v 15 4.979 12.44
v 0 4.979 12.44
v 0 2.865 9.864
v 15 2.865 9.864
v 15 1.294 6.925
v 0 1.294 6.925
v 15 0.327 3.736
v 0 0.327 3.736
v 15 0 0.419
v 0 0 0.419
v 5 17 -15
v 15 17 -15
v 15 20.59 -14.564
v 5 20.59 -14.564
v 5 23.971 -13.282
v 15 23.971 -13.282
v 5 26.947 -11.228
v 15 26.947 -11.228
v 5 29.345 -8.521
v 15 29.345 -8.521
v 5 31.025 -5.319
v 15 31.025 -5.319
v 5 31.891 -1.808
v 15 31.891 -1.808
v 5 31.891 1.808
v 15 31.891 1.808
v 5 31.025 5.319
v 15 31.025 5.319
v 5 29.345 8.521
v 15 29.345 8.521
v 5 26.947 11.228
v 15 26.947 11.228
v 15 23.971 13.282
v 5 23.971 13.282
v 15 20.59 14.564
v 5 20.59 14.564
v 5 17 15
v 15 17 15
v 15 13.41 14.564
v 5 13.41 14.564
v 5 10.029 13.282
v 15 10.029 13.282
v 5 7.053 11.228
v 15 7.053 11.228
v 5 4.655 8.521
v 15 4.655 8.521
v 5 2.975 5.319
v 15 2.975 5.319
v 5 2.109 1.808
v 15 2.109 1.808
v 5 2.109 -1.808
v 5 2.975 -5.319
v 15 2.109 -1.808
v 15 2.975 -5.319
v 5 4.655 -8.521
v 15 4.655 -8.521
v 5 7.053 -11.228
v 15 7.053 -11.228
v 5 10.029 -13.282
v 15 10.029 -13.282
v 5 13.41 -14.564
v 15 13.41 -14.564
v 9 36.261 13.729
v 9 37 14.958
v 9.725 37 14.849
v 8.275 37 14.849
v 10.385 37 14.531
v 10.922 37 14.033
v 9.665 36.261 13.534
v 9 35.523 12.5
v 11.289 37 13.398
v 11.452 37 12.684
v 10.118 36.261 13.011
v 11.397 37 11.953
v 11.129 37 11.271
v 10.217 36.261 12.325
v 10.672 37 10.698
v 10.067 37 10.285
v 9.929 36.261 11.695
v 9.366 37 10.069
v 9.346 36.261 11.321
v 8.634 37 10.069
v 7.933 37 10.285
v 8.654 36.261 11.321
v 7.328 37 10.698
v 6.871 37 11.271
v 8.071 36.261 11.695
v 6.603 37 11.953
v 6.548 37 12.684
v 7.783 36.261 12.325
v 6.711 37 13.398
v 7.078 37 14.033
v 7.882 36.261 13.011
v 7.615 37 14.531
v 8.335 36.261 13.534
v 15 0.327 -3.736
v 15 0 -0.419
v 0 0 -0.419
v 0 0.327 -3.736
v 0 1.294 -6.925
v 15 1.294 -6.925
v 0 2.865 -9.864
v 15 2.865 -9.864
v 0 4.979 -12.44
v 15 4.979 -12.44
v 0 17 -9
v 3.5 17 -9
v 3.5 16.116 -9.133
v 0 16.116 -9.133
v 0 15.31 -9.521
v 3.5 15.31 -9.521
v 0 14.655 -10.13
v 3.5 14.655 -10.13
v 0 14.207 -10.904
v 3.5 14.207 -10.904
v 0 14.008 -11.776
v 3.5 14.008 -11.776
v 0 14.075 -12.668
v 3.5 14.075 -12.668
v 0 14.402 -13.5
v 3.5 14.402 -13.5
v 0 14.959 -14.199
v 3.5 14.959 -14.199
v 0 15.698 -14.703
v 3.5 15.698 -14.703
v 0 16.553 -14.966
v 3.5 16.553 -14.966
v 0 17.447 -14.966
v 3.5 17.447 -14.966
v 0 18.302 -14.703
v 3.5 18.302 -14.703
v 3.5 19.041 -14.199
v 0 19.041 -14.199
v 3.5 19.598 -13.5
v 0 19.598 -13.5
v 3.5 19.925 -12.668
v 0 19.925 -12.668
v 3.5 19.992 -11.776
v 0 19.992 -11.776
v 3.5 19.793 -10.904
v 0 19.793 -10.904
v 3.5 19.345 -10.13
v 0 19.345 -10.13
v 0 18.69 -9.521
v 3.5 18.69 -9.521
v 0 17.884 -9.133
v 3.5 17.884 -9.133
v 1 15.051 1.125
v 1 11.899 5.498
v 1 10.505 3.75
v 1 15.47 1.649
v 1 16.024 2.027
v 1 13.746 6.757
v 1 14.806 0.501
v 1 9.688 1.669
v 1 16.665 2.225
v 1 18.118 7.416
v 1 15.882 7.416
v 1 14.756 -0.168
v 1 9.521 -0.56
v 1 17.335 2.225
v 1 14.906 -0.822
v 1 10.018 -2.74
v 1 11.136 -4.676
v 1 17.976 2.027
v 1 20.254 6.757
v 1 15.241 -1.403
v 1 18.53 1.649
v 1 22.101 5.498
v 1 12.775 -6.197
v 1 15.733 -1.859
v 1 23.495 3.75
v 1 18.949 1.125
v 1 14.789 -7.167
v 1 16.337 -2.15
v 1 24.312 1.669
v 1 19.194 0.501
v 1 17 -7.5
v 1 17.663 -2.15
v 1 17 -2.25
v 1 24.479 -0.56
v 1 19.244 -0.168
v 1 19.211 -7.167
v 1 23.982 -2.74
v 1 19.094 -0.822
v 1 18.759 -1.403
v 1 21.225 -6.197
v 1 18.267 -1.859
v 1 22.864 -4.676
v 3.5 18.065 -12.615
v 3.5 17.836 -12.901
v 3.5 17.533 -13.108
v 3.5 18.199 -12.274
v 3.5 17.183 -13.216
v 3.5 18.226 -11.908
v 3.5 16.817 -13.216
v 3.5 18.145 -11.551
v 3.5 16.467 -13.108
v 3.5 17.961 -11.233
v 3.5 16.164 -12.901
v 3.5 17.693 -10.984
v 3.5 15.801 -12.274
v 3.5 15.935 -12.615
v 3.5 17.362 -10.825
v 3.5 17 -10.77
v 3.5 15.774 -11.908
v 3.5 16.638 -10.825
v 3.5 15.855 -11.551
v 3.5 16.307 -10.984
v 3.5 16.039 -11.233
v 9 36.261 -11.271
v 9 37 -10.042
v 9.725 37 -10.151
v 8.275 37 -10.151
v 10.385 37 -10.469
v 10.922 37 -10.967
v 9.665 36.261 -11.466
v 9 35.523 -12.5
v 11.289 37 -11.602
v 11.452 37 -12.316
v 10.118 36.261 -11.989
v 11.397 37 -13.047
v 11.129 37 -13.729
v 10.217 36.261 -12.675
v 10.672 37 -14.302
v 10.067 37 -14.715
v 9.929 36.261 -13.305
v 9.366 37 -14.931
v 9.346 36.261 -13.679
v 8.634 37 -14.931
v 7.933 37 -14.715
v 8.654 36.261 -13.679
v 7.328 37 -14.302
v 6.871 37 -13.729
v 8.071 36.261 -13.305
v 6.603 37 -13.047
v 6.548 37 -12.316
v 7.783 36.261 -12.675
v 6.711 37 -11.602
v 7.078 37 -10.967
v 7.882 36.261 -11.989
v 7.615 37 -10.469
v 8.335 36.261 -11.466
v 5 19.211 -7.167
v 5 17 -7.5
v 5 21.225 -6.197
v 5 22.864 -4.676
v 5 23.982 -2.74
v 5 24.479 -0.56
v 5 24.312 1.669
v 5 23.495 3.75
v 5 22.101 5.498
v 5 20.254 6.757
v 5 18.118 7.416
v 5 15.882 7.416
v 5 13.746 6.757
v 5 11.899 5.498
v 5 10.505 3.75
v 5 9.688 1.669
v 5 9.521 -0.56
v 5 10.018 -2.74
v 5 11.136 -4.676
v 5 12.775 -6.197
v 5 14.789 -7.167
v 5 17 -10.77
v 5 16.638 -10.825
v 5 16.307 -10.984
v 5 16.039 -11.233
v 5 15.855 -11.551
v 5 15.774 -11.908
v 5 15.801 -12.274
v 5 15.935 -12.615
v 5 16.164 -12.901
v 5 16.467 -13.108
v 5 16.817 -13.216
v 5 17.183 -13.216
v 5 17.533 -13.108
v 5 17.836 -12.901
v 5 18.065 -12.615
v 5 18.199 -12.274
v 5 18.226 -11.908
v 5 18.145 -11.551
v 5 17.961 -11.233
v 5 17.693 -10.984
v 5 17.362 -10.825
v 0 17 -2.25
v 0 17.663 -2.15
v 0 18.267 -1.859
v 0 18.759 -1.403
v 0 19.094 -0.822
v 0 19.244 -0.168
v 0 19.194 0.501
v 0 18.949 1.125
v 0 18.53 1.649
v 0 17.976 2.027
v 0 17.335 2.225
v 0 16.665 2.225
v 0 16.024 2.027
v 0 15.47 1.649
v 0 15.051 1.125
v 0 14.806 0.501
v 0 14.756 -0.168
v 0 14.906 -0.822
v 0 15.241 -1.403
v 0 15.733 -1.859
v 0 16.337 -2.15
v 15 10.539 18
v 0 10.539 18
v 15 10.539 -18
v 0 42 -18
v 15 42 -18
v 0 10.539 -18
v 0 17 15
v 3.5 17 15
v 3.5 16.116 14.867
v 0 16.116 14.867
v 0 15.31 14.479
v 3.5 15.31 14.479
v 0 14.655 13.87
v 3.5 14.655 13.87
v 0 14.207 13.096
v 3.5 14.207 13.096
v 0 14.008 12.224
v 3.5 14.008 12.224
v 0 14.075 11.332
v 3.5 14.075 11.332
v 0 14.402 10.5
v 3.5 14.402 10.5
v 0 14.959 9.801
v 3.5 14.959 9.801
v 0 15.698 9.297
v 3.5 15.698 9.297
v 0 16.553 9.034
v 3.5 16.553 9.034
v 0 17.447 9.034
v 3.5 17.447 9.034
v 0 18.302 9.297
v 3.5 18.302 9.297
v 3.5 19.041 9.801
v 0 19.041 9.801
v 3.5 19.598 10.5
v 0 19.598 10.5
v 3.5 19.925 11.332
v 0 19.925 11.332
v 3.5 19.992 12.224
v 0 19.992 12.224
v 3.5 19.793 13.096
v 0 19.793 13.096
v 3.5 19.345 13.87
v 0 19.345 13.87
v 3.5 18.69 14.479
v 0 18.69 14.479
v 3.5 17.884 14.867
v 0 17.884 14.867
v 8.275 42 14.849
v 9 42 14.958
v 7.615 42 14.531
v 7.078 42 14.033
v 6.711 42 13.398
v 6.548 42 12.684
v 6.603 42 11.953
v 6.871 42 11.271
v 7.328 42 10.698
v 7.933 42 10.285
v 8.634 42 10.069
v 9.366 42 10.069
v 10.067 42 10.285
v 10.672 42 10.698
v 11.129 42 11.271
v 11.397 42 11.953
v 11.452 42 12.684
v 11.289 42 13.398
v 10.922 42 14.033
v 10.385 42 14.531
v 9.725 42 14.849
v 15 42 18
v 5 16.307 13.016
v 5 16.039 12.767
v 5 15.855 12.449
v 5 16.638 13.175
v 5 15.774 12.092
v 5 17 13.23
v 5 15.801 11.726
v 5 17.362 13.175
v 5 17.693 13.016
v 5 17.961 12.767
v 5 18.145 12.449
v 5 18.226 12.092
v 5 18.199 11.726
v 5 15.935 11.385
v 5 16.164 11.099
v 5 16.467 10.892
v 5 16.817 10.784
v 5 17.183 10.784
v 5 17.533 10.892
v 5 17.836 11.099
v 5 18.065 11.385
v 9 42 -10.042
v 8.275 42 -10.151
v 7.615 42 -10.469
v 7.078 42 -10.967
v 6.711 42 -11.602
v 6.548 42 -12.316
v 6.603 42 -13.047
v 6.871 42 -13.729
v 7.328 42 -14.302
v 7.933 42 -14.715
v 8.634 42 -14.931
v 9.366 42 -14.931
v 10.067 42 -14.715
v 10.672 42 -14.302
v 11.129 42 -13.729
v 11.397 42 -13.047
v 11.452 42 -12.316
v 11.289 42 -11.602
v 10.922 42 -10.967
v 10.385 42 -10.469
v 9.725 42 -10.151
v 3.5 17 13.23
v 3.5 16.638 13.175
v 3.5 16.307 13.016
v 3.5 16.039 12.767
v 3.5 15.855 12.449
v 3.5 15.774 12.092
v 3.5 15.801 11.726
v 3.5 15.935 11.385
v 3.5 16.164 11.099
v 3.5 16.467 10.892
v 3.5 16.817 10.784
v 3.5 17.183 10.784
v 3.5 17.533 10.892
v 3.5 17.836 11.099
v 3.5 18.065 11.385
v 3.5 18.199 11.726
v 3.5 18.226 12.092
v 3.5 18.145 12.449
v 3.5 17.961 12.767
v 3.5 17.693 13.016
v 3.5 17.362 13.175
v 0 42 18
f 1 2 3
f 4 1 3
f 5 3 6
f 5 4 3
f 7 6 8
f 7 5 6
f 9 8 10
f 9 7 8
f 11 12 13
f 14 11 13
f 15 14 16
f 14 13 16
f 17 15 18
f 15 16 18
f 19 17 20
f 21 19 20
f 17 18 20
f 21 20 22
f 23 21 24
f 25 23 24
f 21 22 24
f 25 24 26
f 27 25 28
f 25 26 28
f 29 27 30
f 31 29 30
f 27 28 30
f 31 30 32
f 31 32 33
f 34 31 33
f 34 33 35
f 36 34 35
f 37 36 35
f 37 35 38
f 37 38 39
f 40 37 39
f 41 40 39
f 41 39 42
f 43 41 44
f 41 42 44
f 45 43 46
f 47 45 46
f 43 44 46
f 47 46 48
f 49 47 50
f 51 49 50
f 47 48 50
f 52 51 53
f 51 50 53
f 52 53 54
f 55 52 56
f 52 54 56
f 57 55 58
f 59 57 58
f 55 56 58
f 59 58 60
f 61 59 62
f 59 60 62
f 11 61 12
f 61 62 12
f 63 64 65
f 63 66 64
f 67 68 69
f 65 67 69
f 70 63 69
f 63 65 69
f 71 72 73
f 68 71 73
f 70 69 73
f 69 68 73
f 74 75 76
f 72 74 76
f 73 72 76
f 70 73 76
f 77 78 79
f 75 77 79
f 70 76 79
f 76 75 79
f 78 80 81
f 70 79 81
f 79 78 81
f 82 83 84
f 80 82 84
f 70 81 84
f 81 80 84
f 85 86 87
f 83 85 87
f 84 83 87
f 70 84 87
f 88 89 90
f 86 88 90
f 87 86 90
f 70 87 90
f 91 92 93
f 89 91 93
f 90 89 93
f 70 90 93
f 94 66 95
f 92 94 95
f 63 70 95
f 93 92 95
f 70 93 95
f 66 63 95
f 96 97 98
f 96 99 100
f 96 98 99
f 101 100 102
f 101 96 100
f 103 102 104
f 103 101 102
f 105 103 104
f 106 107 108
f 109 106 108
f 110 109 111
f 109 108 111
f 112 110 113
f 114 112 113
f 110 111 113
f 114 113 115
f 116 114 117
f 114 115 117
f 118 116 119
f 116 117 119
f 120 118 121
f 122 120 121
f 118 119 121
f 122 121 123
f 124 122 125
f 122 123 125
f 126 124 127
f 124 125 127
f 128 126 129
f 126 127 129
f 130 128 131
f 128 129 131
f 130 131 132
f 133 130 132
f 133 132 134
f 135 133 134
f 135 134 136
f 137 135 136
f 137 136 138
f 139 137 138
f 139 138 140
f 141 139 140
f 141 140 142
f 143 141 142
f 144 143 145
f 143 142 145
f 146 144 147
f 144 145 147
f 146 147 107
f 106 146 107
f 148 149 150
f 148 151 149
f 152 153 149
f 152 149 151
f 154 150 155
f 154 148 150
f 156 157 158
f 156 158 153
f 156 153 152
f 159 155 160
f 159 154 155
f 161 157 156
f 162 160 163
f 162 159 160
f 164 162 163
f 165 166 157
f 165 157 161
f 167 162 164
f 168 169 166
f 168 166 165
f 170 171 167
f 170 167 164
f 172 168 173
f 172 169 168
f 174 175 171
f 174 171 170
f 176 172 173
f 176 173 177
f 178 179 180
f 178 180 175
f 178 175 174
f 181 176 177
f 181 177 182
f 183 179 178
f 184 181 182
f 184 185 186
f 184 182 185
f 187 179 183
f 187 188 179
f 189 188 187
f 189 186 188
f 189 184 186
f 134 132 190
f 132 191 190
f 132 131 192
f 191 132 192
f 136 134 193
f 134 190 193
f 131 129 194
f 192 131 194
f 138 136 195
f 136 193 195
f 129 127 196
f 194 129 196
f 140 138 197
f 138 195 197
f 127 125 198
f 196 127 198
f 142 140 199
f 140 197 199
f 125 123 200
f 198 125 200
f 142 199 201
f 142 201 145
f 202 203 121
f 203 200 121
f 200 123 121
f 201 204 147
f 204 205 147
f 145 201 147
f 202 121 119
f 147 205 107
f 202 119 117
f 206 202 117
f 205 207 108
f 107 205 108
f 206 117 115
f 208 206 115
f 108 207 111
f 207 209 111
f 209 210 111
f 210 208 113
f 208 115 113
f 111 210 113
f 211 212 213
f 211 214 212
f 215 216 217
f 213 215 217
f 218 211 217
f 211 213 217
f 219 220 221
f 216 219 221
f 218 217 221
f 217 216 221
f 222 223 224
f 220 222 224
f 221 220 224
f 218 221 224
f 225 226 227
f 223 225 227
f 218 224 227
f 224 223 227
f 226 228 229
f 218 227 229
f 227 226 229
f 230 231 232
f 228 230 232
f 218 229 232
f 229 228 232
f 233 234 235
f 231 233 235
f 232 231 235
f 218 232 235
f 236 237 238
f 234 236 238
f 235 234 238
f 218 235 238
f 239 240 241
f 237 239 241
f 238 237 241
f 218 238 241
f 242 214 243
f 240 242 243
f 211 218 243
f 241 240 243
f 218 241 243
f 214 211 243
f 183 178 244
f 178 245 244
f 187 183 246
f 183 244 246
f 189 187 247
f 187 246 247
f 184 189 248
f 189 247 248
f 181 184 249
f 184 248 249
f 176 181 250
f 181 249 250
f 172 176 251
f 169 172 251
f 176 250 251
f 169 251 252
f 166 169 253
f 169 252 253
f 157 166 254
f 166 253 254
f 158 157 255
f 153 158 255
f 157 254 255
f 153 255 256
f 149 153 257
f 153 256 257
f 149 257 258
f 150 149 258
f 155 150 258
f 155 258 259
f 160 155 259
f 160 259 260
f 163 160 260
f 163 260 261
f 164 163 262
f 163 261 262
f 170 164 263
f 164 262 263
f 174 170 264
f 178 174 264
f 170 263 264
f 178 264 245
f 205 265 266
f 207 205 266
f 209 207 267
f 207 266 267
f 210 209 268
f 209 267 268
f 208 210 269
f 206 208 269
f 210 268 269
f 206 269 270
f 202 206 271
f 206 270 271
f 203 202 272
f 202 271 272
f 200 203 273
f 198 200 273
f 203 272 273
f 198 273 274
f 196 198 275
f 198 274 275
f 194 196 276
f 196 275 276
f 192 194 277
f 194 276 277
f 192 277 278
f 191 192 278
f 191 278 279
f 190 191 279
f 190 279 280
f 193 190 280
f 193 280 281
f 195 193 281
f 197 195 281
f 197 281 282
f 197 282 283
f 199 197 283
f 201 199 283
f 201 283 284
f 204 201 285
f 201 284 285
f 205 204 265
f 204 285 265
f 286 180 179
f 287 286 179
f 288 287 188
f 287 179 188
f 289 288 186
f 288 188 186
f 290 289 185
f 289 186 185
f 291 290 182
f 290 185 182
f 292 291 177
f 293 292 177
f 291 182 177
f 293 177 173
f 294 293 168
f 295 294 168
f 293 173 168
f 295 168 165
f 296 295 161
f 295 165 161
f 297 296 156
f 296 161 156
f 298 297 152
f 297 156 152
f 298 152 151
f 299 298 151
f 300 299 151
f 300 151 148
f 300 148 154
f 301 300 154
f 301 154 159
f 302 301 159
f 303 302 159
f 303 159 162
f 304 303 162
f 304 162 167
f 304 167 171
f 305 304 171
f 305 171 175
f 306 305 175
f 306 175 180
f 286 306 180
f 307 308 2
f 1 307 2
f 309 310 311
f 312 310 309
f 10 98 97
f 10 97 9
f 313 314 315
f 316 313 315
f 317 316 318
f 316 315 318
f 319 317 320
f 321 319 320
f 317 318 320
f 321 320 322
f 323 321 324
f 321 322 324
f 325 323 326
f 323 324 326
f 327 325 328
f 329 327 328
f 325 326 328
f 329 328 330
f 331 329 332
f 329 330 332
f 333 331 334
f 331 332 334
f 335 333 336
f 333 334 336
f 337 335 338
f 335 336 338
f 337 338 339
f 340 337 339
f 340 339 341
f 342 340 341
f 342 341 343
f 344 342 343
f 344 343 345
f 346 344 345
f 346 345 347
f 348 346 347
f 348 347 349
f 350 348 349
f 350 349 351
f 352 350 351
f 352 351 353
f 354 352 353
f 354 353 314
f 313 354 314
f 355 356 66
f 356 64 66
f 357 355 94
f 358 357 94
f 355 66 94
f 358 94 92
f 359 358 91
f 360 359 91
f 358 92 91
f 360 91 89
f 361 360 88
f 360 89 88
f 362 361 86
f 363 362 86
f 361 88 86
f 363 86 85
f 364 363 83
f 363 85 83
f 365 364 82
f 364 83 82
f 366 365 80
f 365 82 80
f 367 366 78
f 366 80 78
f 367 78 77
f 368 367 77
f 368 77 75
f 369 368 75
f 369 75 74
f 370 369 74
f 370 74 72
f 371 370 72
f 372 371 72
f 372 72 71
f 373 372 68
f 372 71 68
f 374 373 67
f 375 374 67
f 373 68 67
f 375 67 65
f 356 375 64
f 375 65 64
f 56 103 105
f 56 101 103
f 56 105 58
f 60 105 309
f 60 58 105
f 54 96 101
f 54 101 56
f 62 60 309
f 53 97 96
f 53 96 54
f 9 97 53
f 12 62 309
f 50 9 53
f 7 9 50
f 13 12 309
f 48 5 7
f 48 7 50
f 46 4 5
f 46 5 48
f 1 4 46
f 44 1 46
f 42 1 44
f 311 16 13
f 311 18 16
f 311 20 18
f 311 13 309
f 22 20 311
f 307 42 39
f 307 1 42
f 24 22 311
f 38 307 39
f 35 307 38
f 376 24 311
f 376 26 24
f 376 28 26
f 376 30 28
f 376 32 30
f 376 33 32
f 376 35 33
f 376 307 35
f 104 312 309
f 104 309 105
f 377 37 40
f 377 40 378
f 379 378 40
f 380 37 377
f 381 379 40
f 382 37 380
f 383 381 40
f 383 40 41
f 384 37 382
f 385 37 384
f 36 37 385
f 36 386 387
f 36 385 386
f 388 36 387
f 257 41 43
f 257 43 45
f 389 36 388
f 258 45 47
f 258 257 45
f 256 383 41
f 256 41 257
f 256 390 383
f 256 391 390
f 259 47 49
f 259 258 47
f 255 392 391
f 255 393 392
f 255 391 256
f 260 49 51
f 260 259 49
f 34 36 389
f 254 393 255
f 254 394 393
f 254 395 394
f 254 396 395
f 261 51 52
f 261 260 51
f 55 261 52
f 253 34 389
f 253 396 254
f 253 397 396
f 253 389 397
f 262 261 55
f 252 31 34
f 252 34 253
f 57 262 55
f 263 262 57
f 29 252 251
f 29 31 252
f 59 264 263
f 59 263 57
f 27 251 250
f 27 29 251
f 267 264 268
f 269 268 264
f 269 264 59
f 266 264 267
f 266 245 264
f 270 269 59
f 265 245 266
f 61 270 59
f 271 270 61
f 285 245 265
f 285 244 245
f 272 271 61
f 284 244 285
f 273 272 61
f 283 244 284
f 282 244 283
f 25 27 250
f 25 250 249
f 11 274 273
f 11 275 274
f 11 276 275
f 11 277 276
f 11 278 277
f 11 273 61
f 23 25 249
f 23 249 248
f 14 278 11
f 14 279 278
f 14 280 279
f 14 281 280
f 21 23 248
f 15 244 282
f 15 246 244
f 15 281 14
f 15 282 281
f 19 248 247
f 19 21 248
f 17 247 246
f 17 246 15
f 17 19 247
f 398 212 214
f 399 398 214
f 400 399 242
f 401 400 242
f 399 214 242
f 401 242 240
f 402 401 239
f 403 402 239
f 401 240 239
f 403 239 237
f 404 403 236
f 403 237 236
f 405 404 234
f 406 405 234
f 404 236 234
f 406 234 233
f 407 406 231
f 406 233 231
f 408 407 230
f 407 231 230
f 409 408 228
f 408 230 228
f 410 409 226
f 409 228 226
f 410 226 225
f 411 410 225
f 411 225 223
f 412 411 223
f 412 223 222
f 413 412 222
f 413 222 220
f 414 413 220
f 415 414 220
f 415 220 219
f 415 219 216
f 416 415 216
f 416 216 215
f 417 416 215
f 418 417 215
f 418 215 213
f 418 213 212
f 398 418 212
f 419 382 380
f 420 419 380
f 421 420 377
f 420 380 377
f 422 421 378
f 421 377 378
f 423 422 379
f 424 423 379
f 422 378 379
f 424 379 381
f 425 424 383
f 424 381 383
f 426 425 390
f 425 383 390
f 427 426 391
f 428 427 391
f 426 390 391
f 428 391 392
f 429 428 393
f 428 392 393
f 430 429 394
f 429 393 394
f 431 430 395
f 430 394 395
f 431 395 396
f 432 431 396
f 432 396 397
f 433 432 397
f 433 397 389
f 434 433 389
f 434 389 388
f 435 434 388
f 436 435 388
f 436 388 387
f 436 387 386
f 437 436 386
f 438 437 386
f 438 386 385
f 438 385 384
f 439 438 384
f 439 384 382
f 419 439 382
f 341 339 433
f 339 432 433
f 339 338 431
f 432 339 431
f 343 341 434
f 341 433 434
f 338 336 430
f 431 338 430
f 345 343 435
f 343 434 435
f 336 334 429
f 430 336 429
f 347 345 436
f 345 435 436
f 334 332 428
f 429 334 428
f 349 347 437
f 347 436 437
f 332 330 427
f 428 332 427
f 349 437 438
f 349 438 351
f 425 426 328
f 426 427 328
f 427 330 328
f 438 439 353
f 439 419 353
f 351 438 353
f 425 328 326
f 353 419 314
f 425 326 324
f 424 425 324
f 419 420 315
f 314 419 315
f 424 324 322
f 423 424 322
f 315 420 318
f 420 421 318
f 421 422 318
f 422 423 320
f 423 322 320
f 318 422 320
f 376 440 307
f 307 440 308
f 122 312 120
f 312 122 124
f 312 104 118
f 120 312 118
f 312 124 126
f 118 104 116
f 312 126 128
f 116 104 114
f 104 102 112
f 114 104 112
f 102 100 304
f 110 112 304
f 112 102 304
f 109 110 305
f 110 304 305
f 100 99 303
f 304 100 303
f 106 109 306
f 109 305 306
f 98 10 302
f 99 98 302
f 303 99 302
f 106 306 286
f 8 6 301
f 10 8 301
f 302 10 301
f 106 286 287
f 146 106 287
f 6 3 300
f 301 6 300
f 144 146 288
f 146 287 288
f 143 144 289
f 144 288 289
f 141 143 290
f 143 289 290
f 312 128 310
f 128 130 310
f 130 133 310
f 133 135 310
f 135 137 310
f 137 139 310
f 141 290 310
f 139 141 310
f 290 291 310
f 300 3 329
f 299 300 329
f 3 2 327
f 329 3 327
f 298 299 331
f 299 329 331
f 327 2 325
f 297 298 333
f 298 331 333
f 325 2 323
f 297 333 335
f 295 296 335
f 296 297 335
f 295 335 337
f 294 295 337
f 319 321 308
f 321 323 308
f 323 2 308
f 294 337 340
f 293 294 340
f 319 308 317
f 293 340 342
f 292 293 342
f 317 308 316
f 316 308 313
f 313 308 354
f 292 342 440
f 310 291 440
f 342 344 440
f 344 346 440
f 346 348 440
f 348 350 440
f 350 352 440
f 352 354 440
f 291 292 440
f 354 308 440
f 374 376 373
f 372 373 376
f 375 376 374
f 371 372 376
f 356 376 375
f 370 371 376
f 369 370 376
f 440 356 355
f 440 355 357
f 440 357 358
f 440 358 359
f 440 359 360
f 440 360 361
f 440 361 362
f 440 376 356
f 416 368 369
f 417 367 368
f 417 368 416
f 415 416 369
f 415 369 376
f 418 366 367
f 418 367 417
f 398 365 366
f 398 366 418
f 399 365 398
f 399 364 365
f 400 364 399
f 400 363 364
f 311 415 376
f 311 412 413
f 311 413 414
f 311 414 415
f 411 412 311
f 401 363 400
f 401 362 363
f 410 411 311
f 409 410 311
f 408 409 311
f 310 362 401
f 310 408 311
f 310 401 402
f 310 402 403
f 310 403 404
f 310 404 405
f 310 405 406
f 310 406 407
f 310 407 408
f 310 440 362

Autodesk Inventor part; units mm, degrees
ref_plane "YZ Plane" through (0, 0, 0) normal (1, 0, 0) x (0, 1, 0)
ref_plane "XZ Plane" through (0, 0, 0) normal (0, 1, 0) x (-1, 0, 0)
ref_plane "XY Plane" through (0, 0, 0) normal (0, 0, 1) x (1, 0, 0)
sketch "Sketch1" plane through (0, 0, 0) normal (1, 0, 0) x (0, 1, 0)
  circle A0 centre (17, 0) radius 15 construction
  line L0 (42, 0) -> (42, 18)
  line L1 (42, 18) -> (10.539, 18)
  line L2 (10.539, 18) -> (0, 7.461)
  line L3 (0, 7.461) -> (0, 0)
  line L4 (42, 0) -> (0, 0) construction
  line L5 (42, 0) -> (42, -18)
  line L6 (42, -18) -> (10.539, -18)
  line L7 (10.539, -18) -> (0, -7.461)
  line L8 (0, -7.461) -> (0, 0)
  line L9 (0, 15.5075) -> (0, -16.6542) construction
  dimension "d0" = 30
  dimension "d1" = 17
  dimension "d2" = 25
  dimension "d3" = 18
  dimension "d5" = 135
extrude "Extrusion1" add sketch "Sketch1" along normal blind 15
sketch "Sketch2" plane through (15, 0, 0) normal (1, 0, 0) x (0, 0, -1)
  circle A0 centre (0, 17) radius 15
  point P0 (0, 0)
  dimension "d8" = 30
  dimension "d9" = 17
extrude "Extrusion2" cut sketch "Sketch2" against normal blind 10
sketch "Sketch3" plane through (5, 17, 0) normal (1, 0, 0) x (0, 0, -1)
  circle A0 centre (0, 0) radius 7.5
  point P0 (0, -17)
  dimension "d12" = 15
extrude "Extrusion3" cut sketch "Sketch3" against normal blind 4
sketch "Sketch4" plane through (1, 17, 0) normal (1, 0, 0) x (0, 0, -1)
  circle A0 centre (0, 0) radius 7.5 projected
  circle A1 centre (0, 0) radius 2.25
  point P0 (0, -17)
  dimension "d15" = 4.5
extrude "Extrusion4" cut sketch "Sketch4" against normal up to next contours A1
sketch "Sketch5" plane through (0, 0, 0) normal (-1, 0, 0) x (0, 0, 1)
  circle A0 centre (0, 17) radius 2.25 projected
  circle A1 centre (0, 17) radius 12 construction
  point P0 (0, 0)
  point P1 (-12, 17)
  point P2 (12, 17)
  dimension "d18" = 24
hole "Hole1" at (0, 17, -12) at (0, 17, 12) direction (1, 0, 0) diameter 2.459 end through all counterbore diameter 6 counterbore depth 3.5
sketch "Sketch6" plane through (0, 42, 18) normal (0, 1, 0) x (1, 0, 0)
  line L0 (0, 18) -> (15, 18) construction
  line L1 (15, 10.539) -> (15, 25.461) construction
  line L2 (15, 36) -> (15, 0) construction
  point P0 (9, 5.5)
  point P1 (9, 30.5)
  dimension "d26" = 12.5
  dimension "d27" = 6
hole "Hole2" at (9, 42, 12.5) at (9, 42, -12.5) direction (0, -1, 0) diameter 4.917 depth 5 tip angle 118 thread size "M6x1" class "6H" standard "ISO Metric profile"
fillet "Fillet1" radius 17 2 edges at (7.5, 0, -7.461) (7.5, 0, 7.461)
properties part number "Porte_encodeur"
